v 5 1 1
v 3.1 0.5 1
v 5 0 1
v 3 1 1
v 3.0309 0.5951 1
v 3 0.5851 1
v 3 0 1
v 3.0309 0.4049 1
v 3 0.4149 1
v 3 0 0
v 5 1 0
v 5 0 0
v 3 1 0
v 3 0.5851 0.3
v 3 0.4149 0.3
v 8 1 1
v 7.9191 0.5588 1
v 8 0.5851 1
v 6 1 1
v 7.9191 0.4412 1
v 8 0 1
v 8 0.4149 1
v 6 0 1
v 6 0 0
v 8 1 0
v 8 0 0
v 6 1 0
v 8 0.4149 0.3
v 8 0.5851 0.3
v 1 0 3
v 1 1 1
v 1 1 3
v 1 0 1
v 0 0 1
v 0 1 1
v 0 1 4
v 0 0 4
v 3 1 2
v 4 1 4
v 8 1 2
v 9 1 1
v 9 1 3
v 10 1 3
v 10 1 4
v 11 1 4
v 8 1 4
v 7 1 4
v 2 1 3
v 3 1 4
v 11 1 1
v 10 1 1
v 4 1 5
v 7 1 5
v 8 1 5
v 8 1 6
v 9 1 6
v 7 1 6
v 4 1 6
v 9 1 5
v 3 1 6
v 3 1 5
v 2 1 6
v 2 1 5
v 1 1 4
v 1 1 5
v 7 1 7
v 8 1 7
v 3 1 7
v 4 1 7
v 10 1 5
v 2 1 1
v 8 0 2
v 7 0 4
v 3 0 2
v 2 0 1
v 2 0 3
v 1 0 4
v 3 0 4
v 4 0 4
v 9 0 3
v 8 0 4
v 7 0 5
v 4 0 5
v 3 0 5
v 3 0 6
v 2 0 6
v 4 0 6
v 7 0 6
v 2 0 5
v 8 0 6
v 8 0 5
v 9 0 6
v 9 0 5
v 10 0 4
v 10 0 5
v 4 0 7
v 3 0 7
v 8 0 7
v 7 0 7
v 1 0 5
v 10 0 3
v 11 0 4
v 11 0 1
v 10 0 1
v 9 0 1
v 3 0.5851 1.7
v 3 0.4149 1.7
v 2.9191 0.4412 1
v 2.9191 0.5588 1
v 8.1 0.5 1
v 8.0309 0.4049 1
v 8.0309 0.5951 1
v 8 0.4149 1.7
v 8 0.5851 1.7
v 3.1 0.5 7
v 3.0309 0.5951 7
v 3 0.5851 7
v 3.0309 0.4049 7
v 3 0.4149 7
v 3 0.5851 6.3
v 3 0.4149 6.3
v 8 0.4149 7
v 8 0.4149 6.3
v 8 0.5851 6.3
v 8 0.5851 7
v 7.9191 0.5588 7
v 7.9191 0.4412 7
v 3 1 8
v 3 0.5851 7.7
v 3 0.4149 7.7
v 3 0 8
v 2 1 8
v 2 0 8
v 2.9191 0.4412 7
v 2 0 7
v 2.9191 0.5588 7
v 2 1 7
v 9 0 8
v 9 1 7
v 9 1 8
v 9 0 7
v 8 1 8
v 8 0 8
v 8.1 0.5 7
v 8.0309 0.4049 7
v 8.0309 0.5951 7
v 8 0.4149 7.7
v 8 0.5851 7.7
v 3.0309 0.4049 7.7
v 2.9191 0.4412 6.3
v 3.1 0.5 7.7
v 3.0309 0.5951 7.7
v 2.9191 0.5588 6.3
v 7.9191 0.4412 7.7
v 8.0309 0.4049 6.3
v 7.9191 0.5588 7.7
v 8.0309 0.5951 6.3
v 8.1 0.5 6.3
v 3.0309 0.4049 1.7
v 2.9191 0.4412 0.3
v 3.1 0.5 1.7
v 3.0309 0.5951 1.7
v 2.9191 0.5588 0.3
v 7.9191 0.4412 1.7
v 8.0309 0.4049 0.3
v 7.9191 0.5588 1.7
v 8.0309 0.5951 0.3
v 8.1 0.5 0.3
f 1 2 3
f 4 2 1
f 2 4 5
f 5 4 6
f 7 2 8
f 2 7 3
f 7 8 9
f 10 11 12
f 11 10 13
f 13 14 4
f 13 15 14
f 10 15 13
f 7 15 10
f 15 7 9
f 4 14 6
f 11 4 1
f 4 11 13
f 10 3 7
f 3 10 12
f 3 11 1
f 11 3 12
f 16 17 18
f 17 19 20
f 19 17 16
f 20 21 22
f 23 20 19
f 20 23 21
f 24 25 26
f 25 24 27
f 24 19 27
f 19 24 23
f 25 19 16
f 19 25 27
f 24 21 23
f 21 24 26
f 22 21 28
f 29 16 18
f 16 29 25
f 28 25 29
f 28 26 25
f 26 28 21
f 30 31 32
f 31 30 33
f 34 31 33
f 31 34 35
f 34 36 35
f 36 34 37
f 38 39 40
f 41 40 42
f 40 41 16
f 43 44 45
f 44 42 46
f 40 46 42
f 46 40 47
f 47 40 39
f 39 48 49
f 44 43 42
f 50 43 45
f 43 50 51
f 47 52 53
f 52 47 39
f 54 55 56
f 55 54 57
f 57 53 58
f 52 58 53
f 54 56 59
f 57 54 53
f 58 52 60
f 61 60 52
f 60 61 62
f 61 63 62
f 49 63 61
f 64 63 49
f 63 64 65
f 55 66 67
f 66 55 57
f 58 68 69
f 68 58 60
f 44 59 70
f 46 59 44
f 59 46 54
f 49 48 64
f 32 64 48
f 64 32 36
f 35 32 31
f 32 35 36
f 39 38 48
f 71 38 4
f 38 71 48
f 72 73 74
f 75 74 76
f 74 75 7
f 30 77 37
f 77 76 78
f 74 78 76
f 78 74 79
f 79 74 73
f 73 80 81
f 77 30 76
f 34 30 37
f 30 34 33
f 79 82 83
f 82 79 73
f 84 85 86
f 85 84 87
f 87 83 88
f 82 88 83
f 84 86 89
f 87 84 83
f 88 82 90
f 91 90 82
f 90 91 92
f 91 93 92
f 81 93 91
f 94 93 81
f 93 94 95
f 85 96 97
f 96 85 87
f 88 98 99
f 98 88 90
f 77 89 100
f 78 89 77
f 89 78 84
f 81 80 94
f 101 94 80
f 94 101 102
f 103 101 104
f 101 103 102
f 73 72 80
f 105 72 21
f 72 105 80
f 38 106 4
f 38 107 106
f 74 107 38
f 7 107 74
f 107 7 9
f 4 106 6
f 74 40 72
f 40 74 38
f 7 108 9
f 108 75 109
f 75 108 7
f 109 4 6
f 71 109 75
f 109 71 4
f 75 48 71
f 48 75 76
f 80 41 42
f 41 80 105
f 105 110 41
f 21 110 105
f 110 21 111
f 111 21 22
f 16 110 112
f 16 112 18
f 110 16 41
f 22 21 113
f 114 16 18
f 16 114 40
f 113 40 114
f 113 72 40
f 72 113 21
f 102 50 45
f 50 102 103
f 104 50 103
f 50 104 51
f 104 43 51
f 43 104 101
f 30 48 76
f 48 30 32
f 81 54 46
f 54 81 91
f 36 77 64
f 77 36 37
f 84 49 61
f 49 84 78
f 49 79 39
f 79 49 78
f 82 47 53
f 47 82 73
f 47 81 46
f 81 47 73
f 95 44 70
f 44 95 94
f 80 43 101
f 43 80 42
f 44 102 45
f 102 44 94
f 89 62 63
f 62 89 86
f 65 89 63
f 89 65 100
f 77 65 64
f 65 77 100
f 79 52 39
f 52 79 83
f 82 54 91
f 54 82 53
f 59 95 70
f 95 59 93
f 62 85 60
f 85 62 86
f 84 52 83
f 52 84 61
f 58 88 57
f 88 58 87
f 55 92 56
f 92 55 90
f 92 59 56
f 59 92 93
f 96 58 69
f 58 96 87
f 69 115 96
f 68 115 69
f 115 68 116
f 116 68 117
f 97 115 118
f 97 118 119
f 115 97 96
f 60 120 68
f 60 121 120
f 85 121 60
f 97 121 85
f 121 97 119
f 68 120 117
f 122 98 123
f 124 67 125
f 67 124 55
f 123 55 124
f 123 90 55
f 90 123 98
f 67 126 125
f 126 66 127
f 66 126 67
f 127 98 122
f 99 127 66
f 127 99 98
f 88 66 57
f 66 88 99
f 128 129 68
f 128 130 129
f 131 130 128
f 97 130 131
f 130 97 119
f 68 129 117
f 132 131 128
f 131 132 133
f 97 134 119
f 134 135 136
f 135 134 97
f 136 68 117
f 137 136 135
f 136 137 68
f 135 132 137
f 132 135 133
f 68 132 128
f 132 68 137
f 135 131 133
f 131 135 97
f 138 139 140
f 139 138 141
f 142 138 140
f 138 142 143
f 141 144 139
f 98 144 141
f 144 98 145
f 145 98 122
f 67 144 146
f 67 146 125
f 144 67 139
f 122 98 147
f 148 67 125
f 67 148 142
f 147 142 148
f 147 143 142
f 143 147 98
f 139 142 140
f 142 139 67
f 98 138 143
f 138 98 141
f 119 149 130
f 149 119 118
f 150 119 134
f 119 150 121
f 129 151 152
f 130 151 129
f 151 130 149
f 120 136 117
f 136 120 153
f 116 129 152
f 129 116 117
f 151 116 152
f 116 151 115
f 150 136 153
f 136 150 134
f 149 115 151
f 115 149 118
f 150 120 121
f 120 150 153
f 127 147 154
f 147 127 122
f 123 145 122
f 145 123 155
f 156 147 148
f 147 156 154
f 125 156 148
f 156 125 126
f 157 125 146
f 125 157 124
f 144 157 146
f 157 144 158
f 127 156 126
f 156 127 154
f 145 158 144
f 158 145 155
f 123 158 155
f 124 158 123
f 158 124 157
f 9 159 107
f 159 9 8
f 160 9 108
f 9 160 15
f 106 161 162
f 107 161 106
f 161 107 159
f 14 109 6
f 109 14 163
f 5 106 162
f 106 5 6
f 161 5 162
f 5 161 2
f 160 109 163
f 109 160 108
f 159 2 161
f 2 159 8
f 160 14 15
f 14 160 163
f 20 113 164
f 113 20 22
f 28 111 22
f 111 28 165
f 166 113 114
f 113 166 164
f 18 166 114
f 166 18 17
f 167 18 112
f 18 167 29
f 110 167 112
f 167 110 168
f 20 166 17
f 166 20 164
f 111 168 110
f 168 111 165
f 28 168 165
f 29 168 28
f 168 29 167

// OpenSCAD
//translate([0,0,0]) cube(1);
//translate([1,0,0]) cube(1);
//translate([2,0,0]) cube(1);
translate([3,0,0]) cube(1);
translate([4,0,0]) cube(1);
//translate([5,0,0]) cube(1);
translate([6,0,0]) cube(1);
translate([7,0,0]) cube(1);
//translate([8,0,0]) cube(1);
//translate([9,0,0]) cube(1);
//translate([10,0,0]) cube(1);

translate([0,0,1]) cube(1);
//translate([1,0,1]) cube(1);
translate([2,0,1]) cube(1);
//translate([3,0,1]) cube(1);
//translate([4,0,1]) cube(1);
//translate([5,0,1]) cube(1);
//translate([6,0,1]) cube(1);
//translate([7,0,1]) cube(1);
translate([8,0,1]) cube(1);
//translate([9,0,1]) cube(1);
translate([10,0,1]) cube(1);

translate([0,0,2]) cube(1);
//translate([1,0,2]) cube(1);
translate([2,0,2]) cube(1);
translate([3,0,2]) cube(1);
translate([4,0,2]) cube(1);
translate([5,0,2]) cube(1);
translate([6,0,2]) cube(1);
translate([7,0,2]) cube(1);
translate([8,0,2]) cube(1);
//translate([9,0,2]) cube(1);
translate([10,0,2]) cube(1);

translate([0,0,3]) cube(1);
translate([1,0,3]) cube(1);
translate([2,0,3]) cube(1);
translate([3,0,3]) cube(1);
translate([4,0,3]) cube(1);
translate([5,0,3]) cube(1);
translate([6,0,3]) cube(1);
translate([7,0,3]) cube(1);
translate([8,0,3]) cube(1);
translate([9,0,3]) cube(1);
translate([10,0,3]) cube(1);

//translate([0,0,4]) cube(1);
translate([1,0,4]) cube(1);
translate([2,0,4]) cube(1);
//translate([3,0,4]) cube(1);
translate([4,0,4]) cube(1);
translate([5,0,4]) cube(1);
translate([6,0,4]) cube(1);
//translate([7,0,4]) cube(1);
translate([8,0,4]) cube(1);
translate([9,0,4]) cube(1);
//translate([10,0,4]) cube(1);

//translate([0,0,5]) cube(1);
//translate([1,0,5]) cube(1);
translate([2,0,5]) cube(1);
translate([3,0,5]) cube(1);
translate([4,0,5]) cube(1);
translate([5,0,5]) cube(1);
translate([6,0,5]) cube(1);
translate([7,0,5]) cube(1);
translate([8,0,5]) cube(1);
//translate([9,0,5]) cube(1);
//translate([10,0,5]) cube(1);

//translate([0,0,6]) cube(1);
//translate([1,0,6]) cube(1);
//translate([2,0,6]) cube(1);
translate([3,0,6]) cube(1);
//translate([4,0,6]) cube(1);
//translate([5,0,6]) cube(1);
//translate([6,0,6]) cube(1);
translate([7,0,6]) cube(1);
//translate([8,0,6]) cube(1);
//translate([9,0,6]) cube(1);
//translate([10,0,6]) cube(1);

//translate([0,0,7]) cube(1);
//translate([1,0,7]) cube(1);
translate([2,0,7]) cube(1);
//translate([3,0,7]) cube(1);
//translate([4,0,7]) cube(1);
//translate([5,0,7]) cube(1);
//translate([6,0,7]) cube(1);
//translate([7,0,7]) cube(1);
translate([8,0,7]) cube(1);
//translate([9,0,7]) cube(1);
//translate([10,0,7]) cube(1);

translate([3,0.5,7]) cylinder(h = 1.4, r = 0.1, center=true);

translate([8,0.5,7]) cylinder(h = 1.4, r = 0.1, center=true);

translate([3,0.5,1]) cylinder(h = 1.4, r = 0.1, center=true);

translate([8,0.5,1]) cylinder(h = 1.4, r = 0.1, center=true);
